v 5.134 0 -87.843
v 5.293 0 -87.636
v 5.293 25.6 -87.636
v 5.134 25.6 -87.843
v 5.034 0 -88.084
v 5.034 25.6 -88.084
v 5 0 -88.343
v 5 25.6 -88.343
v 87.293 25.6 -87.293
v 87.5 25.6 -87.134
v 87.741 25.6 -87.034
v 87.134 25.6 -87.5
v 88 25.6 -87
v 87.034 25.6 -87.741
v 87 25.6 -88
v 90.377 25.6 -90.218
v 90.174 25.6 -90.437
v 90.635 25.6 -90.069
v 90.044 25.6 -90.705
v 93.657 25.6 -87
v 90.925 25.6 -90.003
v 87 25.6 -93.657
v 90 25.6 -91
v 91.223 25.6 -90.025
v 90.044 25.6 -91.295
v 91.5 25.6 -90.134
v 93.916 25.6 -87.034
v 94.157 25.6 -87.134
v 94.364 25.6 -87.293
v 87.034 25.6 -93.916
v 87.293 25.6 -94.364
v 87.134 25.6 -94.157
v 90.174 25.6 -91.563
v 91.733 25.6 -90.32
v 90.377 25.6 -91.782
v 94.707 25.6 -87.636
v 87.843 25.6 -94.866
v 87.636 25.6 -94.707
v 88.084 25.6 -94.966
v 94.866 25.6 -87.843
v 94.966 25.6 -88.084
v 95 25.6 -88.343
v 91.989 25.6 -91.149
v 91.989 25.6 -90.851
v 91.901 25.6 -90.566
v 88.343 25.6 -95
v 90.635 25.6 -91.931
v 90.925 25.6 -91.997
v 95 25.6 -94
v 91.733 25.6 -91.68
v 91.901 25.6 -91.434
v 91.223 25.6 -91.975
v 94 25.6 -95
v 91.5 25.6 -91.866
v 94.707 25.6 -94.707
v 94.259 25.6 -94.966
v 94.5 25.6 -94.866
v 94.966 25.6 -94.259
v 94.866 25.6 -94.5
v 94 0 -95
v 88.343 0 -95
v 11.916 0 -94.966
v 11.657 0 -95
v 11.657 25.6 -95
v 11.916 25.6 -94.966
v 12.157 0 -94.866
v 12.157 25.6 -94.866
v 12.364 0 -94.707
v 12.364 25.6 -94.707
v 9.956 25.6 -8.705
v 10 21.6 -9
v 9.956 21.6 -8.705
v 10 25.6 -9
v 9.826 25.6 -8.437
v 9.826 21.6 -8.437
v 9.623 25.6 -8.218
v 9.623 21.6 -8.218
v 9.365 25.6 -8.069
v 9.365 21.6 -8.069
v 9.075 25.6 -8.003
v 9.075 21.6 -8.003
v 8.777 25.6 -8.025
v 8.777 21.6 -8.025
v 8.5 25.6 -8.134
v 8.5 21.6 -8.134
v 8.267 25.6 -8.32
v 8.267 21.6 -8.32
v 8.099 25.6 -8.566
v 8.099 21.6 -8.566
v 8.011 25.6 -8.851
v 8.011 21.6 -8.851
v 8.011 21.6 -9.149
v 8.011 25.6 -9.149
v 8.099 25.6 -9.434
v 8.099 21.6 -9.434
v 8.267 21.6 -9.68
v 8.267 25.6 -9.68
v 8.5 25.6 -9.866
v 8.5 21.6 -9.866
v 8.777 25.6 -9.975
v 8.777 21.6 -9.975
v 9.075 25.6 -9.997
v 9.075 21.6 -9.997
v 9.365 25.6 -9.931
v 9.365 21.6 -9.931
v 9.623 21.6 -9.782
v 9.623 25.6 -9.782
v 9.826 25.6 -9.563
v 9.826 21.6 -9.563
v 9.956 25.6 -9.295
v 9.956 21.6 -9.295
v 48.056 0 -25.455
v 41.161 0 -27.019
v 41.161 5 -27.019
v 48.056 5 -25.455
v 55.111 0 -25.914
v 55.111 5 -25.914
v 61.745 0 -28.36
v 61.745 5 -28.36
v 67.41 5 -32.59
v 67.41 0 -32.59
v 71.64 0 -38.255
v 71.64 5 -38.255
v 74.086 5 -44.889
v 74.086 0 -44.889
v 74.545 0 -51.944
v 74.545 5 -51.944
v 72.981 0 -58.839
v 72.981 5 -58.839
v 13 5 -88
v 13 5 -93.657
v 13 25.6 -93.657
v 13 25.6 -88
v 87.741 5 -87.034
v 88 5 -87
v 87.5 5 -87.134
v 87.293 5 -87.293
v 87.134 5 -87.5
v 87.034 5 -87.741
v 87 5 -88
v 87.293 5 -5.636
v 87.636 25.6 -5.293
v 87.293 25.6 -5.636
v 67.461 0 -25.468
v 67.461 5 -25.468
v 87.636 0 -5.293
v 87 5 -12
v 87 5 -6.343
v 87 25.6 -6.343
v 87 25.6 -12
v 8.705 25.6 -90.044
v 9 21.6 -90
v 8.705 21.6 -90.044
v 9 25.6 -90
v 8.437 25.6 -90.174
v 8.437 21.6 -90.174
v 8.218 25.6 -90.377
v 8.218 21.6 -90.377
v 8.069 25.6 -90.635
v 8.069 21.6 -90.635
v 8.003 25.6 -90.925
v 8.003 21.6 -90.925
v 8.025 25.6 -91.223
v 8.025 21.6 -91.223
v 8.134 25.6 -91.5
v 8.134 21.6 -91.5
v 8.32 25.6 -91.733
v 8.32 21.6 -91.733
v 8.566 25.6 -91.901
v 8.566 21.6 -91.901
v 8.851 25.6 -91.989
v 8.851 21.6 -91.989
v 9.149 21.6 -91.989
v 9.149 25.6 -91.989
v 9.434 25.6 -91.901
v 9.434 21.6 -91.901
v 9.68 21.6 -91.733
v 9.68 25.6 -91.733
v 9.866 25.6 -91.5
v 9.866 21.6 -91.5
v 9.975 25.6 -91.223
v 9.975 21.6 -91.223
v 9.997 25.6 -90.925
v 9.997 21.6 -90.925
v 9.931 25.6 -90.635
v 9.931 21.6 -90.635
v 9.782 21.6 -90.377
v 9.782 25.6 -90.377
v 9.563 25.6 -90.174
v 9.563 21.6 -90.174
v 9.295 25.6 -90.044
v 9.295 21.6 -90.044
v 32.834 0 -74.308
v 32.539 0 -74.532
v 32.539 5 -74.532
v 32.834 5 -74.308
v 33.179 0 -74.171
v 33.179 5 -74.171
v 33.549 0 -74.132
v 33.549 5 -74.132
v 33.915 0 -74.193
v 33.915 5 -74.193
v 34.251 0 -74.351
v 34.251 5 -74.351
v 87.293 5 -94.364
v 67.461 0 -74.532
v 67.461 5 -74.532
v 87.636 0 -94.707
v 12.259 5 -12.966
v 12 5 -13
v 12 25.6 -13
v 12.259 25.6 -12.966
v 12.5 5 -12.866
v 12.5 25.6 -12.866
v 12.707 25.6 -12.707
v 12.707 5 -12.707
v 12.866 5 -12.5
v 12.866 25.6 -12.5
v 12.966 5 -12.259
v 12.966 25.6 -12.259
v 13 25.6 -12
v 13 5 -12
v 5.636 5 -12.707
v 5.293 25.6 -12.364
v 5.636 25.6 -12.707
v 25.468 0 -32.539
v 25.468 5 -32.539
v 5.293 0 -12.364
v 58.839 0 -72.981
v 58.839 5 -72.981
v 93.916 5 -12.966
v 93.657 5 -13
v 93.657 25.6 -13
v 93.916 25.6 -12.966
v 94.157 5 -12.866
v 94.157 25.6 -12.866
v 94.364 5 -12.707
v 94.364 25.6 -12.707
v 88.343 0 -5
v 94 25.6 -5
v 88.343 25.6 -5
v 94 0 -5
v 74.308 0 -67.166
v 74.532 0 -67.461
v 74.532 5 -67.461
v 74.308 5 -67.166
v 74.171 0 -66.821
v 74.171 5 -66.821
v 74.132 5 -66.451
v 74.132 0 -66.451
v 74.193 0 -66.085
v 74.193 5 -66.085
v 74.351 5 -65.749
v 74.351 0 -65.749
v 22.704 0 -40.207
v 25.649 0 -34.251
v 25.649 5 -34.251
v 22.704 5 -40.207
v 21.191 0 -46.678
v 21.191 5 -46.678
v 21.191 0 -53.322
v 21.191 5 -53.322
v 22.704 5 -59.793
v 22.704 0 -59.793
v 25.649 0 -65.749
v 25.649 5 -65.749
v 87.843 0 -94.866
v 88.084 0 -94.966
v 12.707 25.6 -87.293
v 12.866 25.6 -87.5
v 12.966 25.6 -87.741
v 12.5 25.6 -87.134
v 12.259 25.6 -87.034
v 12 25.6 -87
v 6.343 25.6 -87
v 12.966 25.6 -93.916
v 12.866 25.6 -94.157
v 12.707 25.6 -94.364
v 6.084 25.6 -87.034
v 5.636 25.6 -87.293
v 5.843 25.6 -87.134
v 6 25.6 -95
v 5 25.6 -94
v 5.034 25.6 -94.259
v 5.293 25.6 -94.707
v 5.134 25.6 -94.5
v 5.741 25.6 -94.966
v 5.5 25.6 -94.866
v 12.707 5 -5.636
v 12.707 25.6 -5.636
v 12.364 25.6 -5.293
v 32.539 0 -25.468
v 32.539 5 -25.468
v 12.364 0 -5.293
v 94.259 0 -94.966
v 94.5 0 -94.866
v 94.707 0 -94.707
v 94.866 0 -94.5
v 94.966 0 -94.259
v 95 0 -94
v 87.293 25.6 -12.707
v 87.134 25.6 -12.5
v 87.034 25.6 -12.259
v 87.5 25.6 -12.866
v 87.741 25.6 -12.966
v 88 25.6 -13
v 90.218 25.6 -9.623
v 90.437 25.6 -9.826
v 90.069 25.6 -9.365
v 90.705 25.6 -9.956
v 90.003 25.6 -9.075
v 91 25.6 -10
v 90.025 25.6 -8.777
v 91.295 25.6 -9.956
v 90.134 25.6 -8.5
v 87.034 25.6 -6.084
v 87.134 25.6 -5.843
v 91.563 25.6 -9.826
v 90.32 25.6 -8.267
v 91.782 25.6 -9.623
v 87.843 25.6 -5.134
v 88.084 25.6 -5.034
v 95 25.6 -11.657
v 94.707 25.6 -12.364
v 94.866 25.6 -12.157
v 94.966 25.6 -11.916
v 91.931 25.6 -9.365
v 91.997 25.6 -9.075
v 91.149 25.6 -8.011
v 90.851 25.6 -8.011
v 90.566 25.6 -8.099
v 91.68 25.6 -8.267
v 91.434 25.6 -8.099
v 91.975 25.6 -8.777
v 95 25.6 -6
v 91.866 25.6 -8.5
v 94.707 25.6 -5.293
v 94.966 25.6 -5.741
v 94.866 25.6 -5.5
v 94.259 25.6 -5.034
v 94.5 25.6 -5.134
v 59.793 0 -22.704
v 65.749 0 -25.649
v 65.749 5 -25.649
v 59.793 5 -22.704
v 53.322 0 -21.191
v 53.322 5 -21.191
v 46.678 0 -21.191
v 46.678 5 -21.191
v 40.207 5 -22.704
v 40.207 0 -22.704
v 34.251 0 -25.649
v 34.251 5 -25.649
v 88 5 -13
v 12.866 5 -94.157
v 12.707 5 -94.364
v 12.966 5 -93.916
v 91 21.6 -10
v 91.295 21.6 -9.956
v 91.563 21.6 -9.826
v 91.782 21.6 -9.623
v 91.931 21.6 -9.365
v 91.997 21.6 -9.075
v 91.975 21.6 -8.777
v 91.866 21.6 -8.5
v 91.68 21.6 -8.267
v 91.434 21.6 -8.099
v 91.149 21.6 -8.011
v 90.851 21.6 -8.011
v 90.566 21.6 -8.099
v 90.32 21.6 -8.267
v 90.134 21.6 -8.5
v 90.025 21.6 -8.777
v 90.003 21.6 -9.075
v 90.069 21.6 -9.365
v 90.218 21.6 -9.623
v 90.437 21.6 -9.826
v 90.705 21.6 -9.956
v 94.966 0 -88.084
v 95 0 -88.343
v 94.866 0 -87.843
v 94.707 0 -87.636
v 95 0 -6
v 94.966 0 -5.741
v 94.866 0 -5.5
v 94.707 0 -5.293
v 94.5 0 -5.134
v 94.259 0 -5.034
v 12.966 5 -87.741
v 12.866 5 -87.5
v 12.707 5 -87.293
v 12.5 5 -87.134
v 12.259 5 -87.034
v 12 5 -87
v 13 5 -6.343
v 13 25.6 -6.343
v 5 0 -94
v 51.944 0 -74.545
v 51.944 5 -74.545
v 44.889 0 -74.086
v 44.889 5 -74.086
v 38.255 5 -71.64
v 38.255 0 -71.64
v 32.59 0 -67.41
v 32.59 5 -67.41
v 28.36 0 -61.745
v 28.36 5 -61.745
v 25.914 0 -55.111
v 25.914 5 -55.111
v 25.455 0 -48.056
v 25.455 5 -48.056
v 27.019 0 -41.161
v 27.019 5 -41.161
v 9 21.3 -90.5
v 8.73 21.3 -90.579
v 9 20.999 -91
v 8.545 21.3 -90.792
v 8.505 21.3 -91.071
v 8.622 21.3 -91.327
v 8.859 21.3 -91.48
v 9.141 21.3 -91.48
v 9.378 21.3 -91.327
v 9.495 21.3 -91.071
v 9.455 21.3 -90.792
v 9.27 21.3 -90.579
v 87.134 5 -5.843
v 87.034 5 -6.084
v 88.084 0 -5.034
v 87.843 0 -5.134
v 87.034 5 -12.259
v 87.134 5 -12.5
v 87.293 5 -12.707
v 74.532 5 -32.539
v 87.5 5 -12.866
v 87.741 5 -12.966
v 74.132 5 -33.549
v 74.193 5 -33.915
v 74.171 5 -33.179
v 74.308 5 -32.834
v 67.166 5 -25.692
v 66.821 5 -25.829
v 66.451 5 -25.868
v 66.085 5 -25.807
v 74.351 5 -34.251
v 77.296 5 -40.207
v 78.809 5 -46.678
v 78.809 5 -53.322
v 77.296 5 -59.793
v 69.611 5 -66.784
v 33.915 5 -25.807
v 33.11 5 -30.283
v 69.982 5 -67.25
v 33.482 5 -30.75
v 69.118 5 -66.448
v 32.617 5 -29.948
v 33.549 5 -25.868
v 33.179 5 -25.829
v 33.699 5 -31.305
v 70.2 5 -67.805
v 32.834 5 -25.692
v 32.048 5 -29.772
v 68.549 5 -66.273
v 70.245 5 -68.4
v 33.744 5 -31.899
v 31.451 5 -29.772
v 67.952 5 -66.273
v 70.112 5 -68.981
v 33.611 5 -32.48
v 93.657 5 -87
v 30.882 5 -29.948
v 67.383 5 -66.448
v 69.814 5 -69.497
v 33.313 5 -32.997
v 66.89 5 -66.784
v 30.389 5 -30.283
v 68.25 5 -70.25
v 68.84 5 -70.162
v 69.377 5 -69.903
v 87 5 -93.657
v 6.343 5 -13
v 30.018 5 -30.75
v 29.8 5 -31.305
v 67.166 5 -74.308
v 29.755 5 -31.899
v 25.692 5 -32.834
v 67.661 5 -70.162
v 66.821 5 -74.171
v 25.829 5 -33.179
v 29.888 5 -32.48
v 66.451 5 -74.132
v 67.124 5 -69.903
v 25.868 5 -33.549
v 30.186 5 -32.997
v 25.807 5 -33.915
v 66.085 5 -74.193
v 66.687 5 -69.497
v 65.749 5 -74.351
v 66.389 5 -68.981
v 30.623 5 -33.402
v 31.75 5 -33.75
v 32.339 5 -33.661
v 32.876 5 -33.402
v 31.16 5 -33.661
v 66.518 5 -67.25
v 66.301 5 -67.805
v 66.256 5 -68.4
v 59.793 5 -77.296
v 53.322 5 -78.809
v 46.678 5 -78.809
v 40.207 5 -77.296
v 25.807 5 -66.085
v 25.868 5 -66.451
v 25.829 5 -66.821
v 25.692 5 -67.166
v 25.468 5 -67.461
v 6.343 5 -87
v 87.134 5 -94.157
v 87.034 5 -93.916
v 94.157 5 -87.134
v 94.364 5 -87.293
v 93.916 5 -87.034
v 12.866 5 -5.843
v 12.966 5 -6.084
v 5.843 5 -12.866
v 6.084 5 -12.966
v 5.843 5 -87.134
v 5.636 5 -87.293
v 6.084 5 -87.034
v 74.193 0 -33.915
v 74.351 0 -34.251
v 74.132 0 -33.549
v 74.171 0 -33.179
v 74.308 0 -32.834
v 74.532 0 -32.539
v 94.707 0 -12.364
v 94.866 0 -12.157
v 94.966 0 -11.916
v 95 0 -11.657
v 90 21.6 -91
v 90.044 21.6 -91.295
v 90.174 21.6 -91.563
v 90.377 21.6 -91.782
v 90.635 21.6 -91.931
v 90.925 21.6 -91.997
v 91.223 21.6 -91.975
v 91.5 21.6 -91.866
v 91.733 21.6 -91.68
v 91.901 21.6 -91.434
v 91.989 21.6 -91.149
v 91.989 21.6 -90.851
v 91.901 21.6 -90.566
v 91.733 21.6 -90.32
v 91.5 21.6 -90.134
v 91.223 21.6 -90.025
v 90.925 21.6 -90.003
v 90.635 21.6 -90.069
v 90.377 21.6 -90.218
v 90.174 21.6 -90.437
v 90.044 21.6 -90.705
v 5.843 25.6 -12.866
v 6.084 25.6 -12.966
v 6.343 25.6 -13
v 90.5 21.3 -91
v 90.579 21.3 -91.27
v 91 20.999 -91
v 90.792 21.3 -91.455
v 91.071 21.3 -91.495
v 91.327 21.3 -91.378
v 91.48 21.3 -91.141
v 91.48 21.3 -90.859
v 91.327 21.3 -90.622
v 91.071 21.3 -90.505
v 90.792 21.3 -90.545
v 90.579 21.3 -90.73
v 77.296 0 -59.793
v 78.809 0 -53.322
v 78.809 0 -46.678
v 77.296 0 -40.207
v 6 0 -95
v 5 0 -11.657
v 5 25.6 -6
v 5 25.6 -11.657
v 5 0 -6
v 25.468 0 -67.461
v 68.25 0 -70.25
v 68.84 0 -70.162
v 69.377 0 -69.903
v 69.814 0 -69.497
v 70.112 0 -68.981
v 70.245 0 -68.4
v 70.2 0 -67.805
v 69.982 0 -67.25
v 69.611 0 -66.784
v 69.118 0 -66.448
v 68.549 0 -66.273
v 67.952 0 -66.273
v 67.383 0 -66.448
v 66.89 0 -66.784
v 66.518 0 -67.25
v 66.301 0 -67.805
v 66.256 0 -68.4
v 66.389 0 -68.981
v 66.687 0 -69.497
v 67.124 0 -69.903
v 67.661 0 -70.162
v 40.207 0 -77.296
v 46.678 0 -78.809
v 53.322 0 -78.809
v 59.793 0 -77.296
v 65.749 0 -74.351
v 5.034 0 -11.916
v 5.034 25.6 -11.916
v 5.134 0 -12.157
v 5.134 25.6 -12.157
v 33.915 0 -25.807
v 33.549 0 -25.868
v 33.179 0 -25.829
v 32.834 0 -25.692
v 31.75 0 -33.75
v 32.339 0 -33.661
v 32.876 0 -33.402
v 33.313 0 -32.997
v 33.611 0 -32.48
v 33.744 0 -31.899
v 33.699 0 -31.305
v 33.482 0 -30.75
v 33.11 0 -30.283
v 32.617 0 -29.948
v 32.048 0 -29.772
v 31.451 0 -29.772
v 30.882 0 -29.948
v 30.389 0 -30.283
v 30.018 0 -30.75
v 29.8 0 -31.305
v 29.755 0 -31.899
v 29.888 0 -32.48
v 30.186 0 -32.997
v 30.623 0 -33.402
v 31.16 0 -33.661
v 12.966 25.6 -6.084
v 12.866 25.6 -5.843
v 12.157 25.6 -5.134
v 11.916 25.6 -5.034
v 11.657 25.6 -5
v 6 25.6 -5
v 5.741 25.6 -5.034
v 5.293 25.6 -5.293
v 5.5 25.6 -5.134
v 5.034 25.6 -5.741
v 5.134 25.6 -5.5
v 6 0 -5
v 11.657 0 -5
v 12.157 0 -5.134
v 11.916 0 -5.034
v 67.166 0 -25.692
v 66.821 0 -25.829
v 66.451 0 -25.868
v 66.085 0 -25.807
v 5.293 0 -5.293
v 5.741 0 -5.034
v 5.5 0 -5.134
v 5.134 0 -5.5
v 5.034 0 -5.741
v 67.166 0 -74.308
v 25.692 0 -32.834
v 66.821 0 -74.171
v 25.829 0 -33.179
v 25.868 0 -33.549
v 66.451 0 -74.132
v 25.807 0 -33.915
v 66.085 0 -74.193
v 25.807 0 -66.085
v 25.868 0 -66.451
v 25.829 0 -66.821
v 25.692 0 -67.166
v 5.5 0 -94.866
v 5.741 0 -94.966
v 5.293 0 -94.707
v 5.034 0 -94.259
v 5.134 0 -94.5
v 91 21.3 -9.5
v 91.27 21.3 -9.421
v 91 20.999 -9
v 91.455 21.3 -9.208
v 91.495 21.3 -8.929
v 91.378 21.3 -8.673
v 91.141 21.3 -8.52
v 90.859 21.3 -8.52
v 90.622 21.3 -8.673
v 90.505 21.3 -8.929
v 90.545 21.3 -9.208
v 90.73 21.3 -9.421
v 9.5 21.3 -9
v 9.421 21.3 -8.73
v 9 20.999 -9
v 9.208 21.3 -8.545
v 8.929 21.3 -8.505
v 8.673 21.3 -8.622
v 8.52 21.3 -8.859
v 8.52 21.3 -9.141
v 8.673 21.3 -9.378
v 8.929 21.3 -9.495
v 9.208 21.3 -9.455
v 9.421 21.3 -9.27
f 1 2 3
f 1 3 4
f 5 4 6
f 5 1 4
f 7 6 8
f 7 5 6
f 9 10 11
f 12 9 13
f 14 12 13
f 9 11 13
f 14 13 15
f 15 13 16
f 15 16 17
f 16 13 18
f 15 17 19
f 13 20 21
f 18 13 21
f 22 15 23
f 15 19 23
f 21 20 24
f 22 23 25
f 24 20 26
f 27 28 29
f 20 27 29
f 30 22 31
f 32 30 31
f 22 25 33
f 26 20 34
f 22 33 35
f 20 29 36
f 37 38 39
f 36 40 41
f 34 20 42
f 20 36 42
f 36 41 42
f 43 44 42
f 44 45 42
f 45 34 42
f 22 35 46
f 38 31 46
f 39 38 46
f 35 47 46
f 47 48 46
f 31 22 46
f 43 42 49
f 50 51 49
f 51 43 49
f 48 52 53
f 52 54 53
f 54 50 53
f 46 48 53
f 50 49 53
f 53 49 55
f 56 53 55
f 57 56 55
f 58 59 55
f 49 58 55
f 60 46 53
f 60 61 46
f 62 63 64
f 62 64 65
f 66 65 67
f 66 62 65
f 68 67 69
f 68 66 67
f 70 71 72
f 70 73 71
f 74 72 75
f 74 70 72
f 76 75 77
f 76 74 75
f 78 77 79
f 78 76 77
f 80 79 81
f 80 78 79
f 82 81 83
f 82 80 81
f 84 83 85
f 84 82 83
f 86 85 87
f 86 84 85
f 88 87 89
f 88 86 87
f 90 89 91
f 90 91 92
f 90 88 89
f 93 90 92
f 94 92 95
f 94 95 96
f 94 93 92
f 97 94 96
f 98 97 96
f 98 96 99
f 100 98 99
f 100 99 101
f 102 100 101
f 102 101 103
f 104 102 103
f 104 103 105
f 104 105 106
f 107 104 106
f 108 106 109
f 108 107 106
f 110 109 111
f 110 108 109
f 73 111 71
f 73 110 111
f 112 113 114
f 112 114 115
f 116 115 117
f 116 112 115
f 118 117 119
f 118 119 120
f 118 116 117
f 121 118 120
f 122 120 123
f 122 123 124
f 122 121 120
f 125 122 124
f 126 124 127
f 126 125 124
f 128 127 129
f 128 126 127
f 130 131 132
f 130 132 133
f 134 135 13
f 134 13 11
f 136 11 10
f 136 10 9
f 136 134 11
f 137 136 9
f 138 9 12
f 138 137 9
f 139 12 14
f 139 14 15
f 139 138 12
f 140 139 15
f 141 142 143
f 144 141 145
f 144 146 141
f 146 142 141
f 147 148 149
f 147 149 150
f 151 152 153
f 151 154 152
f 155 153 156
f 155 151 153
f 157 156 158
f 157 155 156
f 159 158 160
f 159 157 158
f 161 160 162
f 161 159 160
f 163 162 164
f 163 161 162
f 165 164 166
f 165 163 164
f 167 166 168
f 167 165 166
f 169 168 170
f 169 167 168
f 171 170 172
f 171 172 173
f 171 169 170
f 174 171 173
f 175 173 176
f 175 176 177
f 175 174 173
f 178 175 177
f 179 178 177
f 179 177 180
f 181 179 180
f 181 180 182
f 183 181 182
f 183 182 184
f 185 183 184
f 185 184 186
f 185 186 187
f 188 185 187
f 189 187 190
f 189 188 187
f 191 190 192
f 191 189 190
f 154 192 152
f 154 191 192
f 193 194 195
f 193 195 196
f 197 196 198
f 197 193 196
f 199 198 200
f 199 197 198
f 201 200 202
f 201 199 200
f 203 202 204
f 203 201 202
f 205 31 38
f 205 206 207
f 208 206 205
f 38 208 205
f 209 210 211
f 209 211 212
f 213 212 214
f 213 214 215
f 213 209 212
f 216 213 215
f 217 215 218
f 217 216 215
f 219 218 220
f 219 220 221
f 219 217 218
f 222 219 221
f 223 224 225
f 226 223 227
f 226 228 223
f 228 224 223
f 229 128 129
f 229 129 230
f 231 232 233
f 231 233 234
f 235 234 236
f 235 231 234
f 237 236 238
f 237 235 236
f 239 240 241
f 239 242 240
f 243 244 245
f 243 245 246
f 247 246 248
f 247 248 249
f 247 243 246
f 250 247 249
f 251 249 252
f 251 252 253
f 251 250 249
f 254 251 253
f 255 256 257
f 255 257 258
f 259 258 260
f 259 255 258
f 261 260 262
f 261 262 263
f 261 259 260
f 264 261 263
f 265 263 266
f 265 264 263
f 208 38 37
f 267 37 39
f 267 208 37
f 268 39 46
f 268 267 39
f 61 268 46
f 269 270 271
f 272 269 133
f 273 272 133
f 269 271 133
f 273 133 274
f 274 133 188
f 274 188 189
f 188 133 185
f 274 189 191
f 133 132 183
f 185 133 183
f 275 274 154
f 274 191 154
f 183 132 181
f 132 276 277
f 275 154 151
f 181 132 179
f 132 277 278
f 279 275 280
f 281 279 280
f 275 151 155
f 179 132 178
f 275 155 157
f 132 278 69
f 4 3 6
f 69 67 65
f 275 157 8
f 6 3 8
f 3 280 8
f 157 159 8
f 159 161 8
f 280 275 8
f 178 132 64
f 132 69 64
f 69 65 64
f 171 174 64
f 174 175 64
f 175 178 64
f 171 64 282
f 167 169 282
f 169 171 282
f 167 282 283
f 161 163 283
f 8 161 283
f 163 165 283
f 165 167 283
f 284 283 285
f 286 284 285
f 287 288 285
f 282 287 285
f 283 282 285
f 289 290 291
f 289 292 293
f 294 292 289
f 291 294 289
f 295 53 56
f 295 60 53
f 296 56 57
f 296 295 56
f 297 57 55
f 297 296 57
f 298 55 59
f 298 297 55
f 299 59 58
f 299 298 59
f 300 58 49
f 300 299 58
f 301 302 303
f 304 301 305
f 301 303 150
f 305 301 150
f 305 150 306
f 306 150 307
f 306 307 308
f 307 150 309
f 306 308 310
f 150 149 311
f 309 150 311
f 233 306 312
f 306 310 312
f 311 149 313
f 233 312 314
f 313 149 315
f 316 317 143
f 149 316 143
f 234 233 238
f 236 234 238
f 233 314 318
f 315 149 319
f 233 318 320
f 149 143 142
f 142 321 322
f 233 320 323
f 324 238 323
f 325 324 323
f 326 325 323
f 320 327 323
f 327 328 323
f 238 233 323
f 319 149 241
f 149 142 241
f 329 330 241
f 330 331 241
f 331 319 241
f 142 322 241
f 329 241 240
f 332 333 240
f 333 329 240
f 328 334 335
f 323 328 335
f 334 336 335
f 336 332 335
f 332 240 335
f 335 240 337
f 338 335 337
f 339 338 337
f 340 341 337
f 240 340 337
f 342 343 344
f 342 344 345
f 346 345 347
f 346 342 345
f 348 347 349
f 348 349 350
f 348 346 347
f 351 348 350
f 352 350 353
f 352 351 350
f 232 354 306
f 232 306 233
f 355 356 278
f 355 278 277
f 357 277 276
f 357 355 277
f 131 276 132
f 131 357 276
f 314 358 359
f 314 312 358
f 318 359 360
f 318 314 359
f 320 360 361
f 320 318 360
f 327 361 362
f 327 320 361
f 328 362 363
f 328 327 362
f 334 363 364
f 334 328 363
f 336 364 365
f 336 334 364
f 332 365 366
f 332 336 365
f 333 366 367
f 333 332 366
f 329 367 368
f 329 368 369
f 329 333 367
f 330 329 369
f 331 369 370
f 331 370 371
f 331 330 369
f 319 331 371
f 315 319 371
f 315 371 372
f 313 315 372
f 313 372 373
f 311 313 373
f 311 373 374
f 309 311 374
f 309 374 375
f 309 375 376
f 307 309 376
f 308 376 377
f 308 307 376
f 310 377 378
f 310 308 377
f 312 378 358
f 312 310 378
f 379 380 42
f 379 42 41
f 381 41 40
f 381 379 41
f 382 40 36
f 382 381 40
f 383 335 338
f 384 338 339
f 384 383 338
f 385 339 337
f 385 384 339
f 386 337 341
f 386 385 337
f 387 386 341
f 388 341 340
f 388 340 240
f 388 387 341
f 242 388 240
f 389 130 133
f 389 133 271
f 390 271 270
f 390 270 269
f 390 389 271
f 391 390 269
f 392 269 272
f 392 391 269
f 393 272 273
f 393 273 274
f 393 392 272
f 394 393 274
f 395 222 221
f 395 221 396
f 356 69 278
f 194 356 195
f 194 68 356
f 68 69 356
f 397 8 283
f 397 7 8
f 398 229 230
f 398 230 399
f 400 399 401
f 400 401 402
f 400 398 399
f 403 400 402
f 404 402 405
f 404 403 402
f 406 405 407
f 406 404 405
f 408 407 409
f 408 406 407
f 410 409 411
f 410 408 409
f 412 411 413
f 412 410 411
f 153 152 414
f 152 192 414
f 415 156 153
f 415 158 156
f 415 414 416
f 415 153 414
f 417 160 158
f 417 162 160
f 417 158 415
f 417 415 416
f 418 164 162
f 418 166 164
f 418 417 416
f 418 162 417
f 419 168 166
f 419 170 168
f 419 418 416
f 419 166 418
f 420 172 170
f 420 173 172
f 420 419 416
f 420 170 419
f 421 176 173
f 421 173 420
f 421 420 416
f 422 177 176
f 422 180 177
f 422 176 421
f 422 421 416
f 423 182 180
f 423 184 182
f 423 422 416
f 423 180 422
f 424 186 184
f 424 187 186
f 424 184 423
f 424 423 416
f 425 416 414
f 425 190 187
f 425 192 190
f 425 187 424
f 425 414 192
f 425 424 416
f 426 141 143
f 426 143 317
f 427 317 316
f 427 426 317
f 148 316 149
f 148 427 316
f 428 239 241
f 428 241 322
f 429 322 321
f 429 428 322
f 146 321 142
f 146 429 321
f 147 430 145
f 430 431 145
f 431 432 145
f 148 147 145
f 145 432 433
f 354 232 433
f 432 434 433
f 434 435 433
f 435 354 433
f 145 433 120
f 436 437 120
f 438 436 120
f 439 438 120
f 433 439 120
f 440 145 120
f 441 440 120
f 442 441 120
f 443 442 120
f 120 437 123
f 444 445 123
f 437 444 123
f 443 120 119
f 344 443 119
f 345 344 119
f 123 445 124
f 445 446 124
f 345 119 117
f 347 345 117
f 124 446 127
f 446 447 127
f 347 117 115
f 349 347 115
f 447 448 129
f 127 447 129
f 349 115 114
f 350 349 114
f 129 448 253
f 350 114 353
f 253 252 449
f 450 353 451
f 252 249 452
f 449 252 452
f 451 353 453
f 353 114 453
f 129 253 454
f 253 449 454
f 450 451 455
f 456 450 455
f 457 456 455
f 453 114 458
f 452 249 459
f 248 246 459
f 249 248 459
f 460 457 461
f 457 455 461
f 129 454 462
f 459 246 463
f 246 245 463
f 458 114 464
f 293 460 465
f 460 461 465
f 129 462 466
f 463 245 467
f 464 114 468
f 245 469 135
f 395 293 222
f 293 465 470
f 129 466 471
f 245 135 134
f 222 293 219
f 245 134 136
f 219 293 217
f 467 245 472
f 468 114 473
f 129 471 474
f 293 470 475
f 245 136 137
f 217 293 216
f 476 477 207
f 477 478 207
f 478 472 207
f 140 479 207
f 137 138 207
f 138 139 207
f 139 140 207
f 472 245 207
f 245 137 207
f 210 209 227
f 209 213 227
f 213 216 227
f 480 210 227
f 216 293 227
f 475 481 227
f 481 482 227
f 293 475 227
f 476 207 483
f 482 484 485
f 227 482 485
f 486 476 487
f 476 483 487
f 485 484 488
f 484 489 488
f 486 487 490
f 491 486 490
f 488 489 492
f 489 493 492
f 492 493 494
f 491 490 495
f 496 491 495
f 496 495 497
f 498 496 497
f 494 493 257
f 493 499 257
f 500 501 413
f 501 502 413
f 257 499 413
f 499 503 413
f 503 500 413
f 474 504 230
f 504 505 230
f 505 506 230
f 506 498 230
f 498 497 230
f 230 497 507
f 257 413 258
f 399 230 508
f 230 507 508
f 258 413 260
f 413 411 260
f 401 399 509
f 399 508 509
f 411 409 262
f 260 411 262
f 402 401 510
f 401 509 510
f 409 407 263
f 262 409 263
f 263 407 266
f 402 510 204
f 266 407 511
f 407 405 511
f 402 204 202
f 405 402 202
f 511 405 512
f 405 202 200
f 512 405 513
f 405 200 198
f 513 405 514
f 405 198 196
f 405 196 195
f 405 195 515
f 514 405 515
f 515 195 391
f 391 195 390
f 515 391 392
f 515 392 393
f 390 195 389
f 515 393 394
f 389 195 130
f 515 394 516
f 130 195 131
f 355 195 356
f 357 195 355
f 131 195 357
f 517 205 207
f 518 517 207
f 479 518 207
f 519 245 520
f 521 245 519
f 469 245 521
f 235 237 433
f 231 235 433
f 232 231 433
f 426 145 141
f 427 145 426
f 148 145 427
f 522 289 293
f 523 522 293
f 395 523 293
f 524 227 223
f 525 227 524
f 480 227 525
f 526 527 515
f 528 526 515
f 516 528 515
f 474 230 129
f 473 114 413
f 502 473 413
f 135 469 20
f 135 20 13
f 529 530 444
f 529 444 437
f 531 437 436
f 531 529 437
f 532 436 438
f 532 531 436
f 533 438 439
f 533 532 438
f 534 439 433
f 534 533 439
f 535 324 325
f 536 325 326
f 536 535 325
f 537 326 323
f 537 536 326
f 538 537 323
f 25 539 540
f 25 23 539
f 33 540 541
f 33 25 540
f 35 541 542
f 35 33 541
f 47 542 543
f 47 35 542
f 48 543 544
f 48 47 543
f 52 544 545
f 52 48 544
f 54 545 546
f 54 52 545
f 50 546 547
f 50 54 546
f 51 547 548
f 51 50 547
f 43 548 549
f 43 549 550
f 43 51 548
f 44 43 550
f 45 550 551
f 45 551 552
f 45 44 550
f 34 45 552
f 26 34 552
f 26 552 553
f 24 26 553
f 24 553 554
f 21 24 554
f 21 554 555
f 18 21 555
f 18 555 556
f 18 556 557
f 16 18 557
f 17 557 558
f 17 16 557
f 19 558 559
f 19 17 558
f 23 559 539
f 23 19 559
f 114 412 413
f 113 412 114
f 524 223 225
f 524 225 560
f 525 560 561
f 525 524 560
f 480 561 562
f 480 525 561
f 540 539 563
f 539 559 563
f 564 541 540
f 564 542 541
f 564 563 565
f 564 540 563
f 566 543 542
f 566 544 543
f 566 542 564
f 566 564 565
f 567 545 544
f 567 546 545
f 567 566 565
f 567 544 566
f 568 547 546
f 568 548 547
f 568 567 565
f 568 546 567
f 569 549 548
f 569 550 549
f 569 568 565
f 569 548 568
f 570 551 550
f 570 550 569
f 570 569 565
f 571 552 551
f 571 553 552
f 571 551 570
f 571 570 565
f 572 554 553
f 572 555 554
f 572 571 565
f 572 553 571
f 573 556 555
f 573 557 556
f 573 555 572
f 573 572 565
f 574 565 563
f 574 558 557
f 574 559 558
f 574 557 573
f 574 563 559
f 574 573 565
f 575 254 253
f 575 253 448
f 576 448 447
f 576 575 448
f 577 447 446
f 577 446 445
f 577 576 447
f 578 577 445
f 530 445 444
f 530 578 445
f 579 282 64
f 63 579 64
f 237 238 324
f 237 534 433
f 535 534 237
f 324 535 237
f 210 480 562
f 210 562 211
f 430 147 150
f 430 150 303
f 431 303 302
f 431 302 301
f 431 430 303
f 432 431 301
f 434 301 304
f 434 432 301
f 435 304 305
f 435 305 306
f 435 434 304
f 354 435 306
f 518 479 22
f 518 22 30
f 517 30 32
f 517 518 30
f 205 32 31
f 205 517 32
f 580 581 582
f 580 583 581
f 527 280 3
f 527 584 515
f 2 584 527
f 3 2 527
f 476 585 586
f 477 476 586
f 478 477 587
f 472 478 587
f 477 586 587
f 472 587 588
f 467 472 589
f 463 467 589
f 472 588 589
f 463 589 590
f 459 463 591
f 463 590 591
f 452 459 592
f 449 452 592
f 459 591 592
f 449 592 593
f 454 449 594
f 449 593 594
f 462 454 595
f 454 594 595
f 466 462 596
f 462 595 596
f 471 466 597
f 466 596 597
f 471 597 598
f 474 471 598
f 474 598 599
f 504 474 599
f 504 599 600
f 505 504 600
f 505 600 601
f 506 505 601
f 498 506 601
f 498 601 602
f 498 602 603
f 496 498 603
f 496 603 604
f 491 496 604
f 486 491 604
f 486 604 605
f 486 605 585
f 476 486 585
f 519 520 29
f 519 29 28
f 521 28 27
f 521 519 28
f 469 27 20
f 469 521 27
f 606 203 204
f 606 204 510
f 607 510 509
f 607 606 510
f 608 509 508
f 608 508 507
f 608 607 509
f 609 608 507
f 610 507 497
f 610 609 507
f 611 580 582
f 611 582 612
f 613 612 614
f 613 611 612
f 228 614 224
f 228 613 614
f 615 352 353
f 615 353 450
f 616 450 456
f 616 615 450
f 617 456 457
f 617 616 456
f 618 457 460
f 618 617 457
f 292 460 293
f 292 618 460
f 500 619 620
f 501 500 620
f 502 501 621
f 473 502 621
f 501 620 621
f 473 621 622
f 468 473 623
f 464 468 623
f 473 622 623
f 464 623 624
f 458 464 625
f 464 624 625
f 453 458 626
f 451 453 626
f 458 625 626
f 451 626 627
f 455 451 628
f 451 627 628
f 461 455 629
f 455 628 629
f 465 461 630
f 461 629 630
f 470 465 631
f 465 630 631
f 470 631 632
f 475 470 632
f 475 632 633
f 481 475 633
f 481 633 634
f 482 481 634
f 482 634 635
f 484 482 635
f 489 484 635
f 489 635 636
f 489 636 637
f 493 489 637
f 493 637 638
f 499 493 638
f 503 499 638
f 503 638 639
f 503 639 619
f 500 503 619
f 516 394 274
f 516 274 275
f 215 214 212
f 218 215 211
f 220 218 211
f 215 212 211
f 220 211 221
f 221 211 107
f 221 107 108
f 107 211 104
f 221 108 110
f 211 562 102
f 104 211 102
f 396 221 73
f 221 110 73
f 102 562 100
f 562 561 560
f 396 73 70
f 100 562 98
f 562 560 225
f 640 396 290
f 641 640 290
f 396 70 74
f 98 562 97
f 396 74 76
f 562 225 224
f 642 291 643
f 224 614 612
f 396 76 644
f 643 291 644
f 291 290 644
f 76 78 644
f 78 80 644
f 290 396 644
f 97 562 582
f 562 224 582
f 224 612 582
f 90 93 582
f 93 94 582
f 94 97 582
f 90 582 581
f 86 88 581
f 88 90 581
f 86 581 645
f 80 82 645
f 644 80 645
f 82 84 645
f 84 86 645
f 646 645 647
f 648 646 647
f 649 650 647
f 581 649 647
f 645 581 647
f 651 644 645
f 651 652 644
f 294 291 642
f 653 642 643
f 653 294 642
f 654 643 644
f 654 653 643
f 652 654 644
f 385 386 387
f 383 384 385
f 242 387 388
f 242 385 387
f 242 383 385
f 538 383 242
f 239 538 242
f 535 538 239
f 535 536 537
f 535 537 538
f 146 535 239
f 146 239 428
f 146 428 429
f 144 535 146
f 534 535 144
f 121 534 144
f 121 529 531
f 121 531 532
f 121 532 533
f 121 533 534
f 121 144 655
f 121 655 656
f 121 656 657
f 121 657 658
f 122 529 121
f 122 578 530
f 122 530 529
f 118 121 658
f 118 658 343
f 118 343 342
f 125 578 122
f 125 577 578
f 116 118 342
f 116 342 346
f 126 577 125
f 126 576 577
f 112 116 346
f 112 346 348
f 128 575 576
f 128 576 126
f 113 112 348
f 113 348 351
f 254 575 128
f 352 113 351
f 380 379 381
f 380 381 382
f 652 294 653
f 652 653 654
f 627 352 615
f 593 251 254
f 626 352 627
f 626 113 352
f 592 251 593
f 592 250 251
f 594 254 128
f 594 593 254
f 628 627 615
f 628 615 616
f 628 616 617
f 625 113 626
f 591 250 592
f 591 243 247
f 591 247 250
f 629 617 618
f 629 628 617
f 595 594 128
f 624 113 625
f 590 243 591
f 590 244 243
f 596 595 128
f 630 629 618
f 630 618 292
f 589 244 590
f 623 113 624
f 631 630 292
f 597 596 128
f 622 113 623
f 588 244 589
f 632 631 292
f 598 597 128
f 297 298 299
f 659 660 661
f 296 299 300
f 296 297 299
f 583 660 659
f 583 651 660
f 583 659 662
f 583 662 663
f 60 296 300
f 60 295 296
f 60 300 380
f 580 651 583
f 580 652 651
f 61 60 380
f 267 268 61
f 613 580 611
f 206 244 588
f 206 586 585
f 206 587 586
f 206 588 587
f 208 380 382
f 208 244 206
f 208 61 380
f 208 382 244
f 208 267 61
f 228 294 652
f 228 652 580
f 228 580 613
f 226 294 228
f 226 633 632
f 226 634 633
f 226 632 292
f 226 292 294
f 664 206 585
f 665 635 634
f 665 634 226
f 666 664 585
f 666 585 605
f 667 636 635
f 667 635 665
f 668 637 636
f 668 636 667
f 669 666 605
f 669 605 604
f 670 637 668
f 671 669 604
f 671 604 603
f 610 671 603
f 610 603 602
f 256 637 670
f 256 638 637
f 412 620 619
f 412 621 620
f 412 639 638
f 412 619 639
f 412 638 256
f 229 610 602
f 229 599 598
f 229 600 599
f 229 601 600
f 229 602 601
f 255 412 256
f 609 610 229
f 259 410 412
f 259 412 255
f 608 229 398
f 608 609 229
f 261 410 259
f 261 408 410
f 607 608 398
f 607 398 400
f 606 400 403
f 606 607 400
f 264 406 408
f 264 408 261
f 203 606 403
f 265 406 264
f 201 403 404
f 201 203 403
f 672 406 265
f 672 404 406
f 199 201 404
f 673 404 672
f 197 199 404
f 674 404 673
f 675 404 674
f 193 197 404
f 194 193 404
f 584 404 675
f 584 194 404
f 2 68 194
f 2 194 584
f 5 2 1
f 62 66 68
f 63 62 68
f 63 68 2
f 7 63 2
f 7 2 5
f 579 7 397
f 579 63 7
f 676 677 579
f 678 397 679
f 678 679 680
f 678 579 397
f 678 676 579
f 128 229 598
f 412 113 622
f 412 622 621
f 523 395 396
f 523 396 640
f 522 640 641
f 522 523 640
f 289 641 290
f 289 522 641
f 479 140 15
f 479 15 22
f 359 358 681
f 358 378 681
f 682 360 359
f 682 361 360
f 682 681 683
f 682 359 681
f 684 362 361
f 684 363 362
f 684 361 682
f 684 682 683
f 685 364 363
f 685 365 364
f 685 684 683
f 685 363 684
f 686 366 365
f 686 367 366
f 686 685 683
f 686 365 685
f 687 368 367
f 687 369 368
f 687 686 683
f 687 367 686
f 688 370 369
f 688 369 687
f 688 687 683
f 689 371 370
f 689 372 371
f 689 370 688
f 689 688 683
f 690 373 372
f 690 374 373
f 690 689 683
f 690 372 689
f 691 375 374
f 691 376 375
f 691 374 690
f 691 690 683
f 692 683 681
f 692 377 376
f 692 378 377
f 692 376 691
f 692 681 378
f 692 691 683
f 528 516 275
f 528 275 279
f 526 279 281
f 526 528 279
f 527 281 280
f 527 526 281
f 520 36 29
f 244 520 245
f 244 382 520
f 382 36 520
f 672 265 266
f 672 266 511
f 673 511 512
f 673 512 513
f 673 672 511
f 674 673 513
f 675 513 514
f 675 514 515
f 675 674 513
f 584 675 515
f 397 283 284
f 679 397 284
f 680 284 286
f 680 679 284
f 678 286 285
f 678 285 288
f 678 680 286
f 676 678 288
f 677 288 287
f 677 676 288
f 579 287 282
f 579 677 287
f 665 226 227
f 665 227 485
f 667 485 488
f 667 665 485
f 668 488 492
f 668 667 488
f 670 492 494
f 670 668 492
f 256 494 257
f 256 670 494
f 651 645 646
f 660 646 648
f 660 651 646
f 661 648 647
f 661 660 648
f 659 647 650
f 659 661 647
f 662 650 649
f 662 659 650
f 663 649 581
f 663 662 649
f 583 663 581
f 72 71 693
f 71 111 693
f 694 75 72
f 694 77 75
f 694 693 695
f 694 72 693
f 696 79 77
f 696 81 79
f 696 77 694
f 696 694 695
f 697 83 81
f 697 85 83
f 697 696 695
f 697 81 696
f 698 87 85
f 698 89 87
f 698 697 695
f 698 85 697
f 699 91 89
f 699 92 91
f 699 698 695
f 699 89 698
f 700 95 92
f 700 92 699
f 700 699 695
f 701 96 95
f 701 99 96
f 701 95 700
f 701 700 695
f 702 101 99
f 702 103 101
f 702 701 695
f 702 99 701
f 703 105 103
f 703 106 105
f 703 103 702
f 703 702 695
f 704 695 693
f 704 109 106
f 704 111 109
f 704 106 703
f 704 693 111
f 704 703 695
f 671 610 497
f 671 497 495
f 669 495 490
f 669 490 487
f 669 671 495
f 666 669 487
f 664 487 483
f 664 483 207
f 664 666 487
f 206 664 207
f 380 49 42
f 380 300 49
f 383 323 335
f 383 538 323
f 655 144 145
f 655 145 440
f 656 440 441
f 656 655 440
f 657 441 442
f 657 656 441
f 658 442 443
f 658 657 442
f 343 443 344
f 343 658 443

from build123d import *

# Parameters (mm, degrees)
BOSS_EXTRUDE1_DEPTH         = 5
TAP_DRILL_FOR_M4X0_7_TAP1_D = 4
BOSS_EXTRUDE2_DEPTH         = 20.6
CIRPATTERN1_COUNT           = 4


with BuildPart() as part:
    # Sketch1 → Boss-Extrude1 (new body)
    with BuildSketch(Plane(origin=(0, 0, 0), x_dir=(1, 0, 0), z_dir=(0, 1, 0))):
        with BuildLine():
            Line((6, 95), (11.656854249, 95))
            ThreePointArc((11.656854249, 95), (12.039537682, 94.923879533), (12.363961031, 94.707106781))
            Line((12.363961031, 94.707106781), (32.538709783, 74.532358029))
            ThreePointArc((32.538709783, 74.532358029), (33.362638794, 74.138893326), (34.250764856, 74.350802705))
            ThreePointArc((34.250764856, 74.350802705), (50, 79), (65.749235144, 74.350802705))
            ThreePointArc((65.749235144, 74.350802705), (66.637361206, 74.138893326), (67.461290217, 74.532358029))
            Line((67.461290217, 74.532358029), (87.636038969, 94.707106781))
            ThreePointArc((87.636038969, 94.707106781), (87.960462318, 94.923879533), (88.343145751, 95))
            Line((88.343145751, 95), (94, 95))
            ThreePointArc((94, 95), (94.707106781, 94.707106781), (95, 94))
            Line((95, 94), (95, 88.343145751))
            ThreePointArc((95, 88.343145751), (94.923879533, 87.960462318), (94.707106781, 87.636038969))
            Line((94.707106781, 87.636038969), (74.532358029, 67.461290217))
            ThreePointArc((74.532358029, 67.461290217), (74.138893326, 66.637361206), (74.350802705, 65.749235144))
            ThreePointArc((74.350802705, 65.749235144), (79, 50), (74.350802705, 34.250764856))
            ThreePointArc((74.350802705, 34.250764856), (74.138893326, 33.362638794), (74.532358029, 32.538709783))
            Line((74.532358029, 32.538709783), (94.707106781, 12.363961031))
            ThreePointArc((94.707106781, 12.363961031), (94.923879533, 12.039537682), (95, 11.656854249))
            Line((95, 11.656854249), (95, 6))
            ThreePointArc((95, 6), (94.707106781, 5.292893219), (94, 5))
            Line((94, 5), (88.343145751, 5))
            ThreePointArc((88.343145751, 5), (87.960462318, 5.076120467), (87.636038969, 5.292893219))
            Line((87.636038969, 5.292893219), (67.461290217, 25.467641971))
            ThreePointArc((67.461290217, 25.467641971), (66.637361206, 25.861106674), (65.749235144, 25.649197295))
            ThreePointArc((65.749235144, 25.649197295), (50, 21), (34.250764856, 25.649197295))
            ThreePointArc((34.250764856, 25.649197295), (33.362638794, 25.861106674), (32.538709783, 25.467641971))
            Line((32.538709783, 25.467641971), (12.363961031, 5.292893219))
            ThreePointArc((12.363961031, 5.292893219), (12.039537682, 5.076120467), (11.656854249, 5))
            Line((11.656854249, 5), (6, 5))
            ThreePointArc((6, 5), (5.292893219, 5.292893219), (5, 6))
            Line((5, 6), (5, 11.656854249))
            ThreePointArc((5, 11.656854249), (5.076120467, 12.039537682), (5.292893219, 12.363961031))
            Line((5.292893219, 12.363961031), (25.467641971, 32.538709783))
            ThreePointArc((25.467641971, 32.538709783), (25.861106674, 33.362638794), (25.649197295, 34.250764856))
            ThreePointArc((25.649197295, 34.250764856), (21, 50), (25.649197295, 65.749235144))
            ThreePointArc((25.649197295, 65.749235144), (25.861106674, 66.637361206), (25.467641971, 67.461290217))
            Line((25.467641971, 67.461290217), (5.292893219, 87.636038969))
            ThreePointArc((5.292893219, 87.636038969), (5.076120467, 87.960462318), (5, 88.343145751))
            Line((5, 88.343145751), (5, 94))
            ThreePointArc((5, 94), (5.292893219, 94.707106781), (6, 95))
        make_face()
        with BuildLine():
            Line((72.980970389, 58.838834765), (58.838834765, 72.980970389))
            ThreePointArc((58.838834765, 72.980970389), (32.589514654, 67.410485346), (27.019029611, 41.161165235))
            Line((27.019029611, 41.161165235), (41.161165235, 27.019029611))
            ThreePointArc((41.161165235, 27.019029611), (67.410485346, 32.589514654), (72.980970389, 58.838834765))
        make_face(mode=Mode.SUBTRACT)
    extrude(amount=BOSS_EXTRUDE1_DEPTH)

    # Tap Drill for M4x0.7 Tap1 (through all)
    with Locations(Plane(origin=(31.749573978, 5, -31.749573978), x_dir=(0, 0, 1), z_dir=(0, 1, 0))):
        with Locations((0, 0), (-36.500852044, 36.500852044)):
            Hole(TAP_DRILL_FOR_M4X0_7_TAP1_D / 2)

    # Sketch6 → Boss-Extrude2 (add)
    with BuildSketch(Plane(origin=(0, 5, 0), x_dir=(1, 0, 0), z_dir=(0, 1, 0))):
        with BuildLine():
            Line((6, 95), (11.656854249, 95))
            ThreePointArc((11.656854249, 95), (12.039537682, 94.923879533), (12.363961031, 94.707106781))
            Line((12.363961031, 94.707106781), (12.707106781, 94.363961031))
            ThreePointArc((12.707106781, 94.363961031), (12.923879533, 94.039537682), (13, 93.656854249))
            Line((13, 93.656854249), (13, 88))
            ThreePointArc((13, 88), (12.707106781, 87.292893219), (12, 87))
            Line((12, 87), (6.343145751, 87))
            ThreePointArc((6.343145751, 87), (5.960462318, 87.076120467), (5.636038969, 87.292893219))
            Line((5.636038969, 87.292893219), (5.292893219, 87.636038969))
            ThreePointArc((5.292893219, 87.636038969), (5.076120467, 87.960462318), (5, 88.343145751))
            Line((5, 88.343145751), (5, 94))
            ThreePointArc((5, 94), (5.292893219, 94.707106781), (6, 95))
        make_face()
    boss_extrude2 = extrude(amount=BOSS_EXTRUDE2_DEPTH)

    # Sketch9 → Tap Drill for M2x0.4 Tap1 (revolve, cut)
    with BuildSketch(Plane(origin=(9, 25.6, -91), x_dir=(0, 0, 1), z_dir=(1, 0, 0))):
        Polygon((0, 0), (0, 4.600860619), (1, 4), (1, 0), align=None)
    tap_drill_for_m2x0_4_tap1 = revolve(axis=Axis((9, 31.95, -91), (0, -1, 0)), mode=Mode.SUBTRACT)

    # CirPattern1: Boss-Extrude2, Tap Drill for M2x0.4 Tap1 ×4 about axis
    cirpattern1_axis = Axis((50, 5, -50), (0, -1, 0))
    add([boss_extrude2.rotate(cirpattern1_axis, i * 360 / CIRPATTERN1_COUNT) for i in range(1, CIRPATTERN1_COUNT)])
    add([tap_drill_for_m2x0_4_tap1.rotate(cirpattern1_axis, i * 360 / CIRPATTERN1_COUNT) for i in range(1, CIRPATTERN1_COUNT)], mode=Mode.SUBTRACT)


solid = part.part
